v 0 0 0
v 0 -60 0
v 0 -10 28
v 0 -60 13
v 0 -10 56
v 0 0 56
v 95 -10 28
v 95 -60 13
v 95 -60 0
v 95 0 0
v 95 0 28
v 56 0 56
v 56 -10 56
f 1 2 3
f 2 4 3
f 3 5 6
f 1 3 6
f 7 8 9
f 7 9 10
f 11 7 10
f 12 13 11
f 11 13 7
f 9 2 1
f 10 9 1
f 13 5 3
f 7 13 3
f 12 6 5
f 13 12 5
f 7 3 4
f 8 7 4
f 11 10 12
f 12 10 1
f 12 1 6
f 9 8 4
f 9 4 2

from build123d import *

# Parameters (mm, degrees)
F1_DEPTH = 95
F3_DEPTH = 25


with BuildPart() as f1:
    # F0 (on Right) → F1 (new body)
    with BuildSketch(Plane.YZ):
        Polygon((-60, 0), (0, 0), (0, 56), (-10, 56), (-10, 28), (-60, 13), align=None)
    extrude(amount=F1_DEPTH)

    # F2 (on face) → F3 (cut)
    with BuildSketch(Plane.XZ.offset(10)):
        Polygon((95, 56), (56, 56), (95, 28), align=None)
    extrude(amount=-F3_DEPTH, mode=Mode.SUBTRACT)


solid = f1.part
